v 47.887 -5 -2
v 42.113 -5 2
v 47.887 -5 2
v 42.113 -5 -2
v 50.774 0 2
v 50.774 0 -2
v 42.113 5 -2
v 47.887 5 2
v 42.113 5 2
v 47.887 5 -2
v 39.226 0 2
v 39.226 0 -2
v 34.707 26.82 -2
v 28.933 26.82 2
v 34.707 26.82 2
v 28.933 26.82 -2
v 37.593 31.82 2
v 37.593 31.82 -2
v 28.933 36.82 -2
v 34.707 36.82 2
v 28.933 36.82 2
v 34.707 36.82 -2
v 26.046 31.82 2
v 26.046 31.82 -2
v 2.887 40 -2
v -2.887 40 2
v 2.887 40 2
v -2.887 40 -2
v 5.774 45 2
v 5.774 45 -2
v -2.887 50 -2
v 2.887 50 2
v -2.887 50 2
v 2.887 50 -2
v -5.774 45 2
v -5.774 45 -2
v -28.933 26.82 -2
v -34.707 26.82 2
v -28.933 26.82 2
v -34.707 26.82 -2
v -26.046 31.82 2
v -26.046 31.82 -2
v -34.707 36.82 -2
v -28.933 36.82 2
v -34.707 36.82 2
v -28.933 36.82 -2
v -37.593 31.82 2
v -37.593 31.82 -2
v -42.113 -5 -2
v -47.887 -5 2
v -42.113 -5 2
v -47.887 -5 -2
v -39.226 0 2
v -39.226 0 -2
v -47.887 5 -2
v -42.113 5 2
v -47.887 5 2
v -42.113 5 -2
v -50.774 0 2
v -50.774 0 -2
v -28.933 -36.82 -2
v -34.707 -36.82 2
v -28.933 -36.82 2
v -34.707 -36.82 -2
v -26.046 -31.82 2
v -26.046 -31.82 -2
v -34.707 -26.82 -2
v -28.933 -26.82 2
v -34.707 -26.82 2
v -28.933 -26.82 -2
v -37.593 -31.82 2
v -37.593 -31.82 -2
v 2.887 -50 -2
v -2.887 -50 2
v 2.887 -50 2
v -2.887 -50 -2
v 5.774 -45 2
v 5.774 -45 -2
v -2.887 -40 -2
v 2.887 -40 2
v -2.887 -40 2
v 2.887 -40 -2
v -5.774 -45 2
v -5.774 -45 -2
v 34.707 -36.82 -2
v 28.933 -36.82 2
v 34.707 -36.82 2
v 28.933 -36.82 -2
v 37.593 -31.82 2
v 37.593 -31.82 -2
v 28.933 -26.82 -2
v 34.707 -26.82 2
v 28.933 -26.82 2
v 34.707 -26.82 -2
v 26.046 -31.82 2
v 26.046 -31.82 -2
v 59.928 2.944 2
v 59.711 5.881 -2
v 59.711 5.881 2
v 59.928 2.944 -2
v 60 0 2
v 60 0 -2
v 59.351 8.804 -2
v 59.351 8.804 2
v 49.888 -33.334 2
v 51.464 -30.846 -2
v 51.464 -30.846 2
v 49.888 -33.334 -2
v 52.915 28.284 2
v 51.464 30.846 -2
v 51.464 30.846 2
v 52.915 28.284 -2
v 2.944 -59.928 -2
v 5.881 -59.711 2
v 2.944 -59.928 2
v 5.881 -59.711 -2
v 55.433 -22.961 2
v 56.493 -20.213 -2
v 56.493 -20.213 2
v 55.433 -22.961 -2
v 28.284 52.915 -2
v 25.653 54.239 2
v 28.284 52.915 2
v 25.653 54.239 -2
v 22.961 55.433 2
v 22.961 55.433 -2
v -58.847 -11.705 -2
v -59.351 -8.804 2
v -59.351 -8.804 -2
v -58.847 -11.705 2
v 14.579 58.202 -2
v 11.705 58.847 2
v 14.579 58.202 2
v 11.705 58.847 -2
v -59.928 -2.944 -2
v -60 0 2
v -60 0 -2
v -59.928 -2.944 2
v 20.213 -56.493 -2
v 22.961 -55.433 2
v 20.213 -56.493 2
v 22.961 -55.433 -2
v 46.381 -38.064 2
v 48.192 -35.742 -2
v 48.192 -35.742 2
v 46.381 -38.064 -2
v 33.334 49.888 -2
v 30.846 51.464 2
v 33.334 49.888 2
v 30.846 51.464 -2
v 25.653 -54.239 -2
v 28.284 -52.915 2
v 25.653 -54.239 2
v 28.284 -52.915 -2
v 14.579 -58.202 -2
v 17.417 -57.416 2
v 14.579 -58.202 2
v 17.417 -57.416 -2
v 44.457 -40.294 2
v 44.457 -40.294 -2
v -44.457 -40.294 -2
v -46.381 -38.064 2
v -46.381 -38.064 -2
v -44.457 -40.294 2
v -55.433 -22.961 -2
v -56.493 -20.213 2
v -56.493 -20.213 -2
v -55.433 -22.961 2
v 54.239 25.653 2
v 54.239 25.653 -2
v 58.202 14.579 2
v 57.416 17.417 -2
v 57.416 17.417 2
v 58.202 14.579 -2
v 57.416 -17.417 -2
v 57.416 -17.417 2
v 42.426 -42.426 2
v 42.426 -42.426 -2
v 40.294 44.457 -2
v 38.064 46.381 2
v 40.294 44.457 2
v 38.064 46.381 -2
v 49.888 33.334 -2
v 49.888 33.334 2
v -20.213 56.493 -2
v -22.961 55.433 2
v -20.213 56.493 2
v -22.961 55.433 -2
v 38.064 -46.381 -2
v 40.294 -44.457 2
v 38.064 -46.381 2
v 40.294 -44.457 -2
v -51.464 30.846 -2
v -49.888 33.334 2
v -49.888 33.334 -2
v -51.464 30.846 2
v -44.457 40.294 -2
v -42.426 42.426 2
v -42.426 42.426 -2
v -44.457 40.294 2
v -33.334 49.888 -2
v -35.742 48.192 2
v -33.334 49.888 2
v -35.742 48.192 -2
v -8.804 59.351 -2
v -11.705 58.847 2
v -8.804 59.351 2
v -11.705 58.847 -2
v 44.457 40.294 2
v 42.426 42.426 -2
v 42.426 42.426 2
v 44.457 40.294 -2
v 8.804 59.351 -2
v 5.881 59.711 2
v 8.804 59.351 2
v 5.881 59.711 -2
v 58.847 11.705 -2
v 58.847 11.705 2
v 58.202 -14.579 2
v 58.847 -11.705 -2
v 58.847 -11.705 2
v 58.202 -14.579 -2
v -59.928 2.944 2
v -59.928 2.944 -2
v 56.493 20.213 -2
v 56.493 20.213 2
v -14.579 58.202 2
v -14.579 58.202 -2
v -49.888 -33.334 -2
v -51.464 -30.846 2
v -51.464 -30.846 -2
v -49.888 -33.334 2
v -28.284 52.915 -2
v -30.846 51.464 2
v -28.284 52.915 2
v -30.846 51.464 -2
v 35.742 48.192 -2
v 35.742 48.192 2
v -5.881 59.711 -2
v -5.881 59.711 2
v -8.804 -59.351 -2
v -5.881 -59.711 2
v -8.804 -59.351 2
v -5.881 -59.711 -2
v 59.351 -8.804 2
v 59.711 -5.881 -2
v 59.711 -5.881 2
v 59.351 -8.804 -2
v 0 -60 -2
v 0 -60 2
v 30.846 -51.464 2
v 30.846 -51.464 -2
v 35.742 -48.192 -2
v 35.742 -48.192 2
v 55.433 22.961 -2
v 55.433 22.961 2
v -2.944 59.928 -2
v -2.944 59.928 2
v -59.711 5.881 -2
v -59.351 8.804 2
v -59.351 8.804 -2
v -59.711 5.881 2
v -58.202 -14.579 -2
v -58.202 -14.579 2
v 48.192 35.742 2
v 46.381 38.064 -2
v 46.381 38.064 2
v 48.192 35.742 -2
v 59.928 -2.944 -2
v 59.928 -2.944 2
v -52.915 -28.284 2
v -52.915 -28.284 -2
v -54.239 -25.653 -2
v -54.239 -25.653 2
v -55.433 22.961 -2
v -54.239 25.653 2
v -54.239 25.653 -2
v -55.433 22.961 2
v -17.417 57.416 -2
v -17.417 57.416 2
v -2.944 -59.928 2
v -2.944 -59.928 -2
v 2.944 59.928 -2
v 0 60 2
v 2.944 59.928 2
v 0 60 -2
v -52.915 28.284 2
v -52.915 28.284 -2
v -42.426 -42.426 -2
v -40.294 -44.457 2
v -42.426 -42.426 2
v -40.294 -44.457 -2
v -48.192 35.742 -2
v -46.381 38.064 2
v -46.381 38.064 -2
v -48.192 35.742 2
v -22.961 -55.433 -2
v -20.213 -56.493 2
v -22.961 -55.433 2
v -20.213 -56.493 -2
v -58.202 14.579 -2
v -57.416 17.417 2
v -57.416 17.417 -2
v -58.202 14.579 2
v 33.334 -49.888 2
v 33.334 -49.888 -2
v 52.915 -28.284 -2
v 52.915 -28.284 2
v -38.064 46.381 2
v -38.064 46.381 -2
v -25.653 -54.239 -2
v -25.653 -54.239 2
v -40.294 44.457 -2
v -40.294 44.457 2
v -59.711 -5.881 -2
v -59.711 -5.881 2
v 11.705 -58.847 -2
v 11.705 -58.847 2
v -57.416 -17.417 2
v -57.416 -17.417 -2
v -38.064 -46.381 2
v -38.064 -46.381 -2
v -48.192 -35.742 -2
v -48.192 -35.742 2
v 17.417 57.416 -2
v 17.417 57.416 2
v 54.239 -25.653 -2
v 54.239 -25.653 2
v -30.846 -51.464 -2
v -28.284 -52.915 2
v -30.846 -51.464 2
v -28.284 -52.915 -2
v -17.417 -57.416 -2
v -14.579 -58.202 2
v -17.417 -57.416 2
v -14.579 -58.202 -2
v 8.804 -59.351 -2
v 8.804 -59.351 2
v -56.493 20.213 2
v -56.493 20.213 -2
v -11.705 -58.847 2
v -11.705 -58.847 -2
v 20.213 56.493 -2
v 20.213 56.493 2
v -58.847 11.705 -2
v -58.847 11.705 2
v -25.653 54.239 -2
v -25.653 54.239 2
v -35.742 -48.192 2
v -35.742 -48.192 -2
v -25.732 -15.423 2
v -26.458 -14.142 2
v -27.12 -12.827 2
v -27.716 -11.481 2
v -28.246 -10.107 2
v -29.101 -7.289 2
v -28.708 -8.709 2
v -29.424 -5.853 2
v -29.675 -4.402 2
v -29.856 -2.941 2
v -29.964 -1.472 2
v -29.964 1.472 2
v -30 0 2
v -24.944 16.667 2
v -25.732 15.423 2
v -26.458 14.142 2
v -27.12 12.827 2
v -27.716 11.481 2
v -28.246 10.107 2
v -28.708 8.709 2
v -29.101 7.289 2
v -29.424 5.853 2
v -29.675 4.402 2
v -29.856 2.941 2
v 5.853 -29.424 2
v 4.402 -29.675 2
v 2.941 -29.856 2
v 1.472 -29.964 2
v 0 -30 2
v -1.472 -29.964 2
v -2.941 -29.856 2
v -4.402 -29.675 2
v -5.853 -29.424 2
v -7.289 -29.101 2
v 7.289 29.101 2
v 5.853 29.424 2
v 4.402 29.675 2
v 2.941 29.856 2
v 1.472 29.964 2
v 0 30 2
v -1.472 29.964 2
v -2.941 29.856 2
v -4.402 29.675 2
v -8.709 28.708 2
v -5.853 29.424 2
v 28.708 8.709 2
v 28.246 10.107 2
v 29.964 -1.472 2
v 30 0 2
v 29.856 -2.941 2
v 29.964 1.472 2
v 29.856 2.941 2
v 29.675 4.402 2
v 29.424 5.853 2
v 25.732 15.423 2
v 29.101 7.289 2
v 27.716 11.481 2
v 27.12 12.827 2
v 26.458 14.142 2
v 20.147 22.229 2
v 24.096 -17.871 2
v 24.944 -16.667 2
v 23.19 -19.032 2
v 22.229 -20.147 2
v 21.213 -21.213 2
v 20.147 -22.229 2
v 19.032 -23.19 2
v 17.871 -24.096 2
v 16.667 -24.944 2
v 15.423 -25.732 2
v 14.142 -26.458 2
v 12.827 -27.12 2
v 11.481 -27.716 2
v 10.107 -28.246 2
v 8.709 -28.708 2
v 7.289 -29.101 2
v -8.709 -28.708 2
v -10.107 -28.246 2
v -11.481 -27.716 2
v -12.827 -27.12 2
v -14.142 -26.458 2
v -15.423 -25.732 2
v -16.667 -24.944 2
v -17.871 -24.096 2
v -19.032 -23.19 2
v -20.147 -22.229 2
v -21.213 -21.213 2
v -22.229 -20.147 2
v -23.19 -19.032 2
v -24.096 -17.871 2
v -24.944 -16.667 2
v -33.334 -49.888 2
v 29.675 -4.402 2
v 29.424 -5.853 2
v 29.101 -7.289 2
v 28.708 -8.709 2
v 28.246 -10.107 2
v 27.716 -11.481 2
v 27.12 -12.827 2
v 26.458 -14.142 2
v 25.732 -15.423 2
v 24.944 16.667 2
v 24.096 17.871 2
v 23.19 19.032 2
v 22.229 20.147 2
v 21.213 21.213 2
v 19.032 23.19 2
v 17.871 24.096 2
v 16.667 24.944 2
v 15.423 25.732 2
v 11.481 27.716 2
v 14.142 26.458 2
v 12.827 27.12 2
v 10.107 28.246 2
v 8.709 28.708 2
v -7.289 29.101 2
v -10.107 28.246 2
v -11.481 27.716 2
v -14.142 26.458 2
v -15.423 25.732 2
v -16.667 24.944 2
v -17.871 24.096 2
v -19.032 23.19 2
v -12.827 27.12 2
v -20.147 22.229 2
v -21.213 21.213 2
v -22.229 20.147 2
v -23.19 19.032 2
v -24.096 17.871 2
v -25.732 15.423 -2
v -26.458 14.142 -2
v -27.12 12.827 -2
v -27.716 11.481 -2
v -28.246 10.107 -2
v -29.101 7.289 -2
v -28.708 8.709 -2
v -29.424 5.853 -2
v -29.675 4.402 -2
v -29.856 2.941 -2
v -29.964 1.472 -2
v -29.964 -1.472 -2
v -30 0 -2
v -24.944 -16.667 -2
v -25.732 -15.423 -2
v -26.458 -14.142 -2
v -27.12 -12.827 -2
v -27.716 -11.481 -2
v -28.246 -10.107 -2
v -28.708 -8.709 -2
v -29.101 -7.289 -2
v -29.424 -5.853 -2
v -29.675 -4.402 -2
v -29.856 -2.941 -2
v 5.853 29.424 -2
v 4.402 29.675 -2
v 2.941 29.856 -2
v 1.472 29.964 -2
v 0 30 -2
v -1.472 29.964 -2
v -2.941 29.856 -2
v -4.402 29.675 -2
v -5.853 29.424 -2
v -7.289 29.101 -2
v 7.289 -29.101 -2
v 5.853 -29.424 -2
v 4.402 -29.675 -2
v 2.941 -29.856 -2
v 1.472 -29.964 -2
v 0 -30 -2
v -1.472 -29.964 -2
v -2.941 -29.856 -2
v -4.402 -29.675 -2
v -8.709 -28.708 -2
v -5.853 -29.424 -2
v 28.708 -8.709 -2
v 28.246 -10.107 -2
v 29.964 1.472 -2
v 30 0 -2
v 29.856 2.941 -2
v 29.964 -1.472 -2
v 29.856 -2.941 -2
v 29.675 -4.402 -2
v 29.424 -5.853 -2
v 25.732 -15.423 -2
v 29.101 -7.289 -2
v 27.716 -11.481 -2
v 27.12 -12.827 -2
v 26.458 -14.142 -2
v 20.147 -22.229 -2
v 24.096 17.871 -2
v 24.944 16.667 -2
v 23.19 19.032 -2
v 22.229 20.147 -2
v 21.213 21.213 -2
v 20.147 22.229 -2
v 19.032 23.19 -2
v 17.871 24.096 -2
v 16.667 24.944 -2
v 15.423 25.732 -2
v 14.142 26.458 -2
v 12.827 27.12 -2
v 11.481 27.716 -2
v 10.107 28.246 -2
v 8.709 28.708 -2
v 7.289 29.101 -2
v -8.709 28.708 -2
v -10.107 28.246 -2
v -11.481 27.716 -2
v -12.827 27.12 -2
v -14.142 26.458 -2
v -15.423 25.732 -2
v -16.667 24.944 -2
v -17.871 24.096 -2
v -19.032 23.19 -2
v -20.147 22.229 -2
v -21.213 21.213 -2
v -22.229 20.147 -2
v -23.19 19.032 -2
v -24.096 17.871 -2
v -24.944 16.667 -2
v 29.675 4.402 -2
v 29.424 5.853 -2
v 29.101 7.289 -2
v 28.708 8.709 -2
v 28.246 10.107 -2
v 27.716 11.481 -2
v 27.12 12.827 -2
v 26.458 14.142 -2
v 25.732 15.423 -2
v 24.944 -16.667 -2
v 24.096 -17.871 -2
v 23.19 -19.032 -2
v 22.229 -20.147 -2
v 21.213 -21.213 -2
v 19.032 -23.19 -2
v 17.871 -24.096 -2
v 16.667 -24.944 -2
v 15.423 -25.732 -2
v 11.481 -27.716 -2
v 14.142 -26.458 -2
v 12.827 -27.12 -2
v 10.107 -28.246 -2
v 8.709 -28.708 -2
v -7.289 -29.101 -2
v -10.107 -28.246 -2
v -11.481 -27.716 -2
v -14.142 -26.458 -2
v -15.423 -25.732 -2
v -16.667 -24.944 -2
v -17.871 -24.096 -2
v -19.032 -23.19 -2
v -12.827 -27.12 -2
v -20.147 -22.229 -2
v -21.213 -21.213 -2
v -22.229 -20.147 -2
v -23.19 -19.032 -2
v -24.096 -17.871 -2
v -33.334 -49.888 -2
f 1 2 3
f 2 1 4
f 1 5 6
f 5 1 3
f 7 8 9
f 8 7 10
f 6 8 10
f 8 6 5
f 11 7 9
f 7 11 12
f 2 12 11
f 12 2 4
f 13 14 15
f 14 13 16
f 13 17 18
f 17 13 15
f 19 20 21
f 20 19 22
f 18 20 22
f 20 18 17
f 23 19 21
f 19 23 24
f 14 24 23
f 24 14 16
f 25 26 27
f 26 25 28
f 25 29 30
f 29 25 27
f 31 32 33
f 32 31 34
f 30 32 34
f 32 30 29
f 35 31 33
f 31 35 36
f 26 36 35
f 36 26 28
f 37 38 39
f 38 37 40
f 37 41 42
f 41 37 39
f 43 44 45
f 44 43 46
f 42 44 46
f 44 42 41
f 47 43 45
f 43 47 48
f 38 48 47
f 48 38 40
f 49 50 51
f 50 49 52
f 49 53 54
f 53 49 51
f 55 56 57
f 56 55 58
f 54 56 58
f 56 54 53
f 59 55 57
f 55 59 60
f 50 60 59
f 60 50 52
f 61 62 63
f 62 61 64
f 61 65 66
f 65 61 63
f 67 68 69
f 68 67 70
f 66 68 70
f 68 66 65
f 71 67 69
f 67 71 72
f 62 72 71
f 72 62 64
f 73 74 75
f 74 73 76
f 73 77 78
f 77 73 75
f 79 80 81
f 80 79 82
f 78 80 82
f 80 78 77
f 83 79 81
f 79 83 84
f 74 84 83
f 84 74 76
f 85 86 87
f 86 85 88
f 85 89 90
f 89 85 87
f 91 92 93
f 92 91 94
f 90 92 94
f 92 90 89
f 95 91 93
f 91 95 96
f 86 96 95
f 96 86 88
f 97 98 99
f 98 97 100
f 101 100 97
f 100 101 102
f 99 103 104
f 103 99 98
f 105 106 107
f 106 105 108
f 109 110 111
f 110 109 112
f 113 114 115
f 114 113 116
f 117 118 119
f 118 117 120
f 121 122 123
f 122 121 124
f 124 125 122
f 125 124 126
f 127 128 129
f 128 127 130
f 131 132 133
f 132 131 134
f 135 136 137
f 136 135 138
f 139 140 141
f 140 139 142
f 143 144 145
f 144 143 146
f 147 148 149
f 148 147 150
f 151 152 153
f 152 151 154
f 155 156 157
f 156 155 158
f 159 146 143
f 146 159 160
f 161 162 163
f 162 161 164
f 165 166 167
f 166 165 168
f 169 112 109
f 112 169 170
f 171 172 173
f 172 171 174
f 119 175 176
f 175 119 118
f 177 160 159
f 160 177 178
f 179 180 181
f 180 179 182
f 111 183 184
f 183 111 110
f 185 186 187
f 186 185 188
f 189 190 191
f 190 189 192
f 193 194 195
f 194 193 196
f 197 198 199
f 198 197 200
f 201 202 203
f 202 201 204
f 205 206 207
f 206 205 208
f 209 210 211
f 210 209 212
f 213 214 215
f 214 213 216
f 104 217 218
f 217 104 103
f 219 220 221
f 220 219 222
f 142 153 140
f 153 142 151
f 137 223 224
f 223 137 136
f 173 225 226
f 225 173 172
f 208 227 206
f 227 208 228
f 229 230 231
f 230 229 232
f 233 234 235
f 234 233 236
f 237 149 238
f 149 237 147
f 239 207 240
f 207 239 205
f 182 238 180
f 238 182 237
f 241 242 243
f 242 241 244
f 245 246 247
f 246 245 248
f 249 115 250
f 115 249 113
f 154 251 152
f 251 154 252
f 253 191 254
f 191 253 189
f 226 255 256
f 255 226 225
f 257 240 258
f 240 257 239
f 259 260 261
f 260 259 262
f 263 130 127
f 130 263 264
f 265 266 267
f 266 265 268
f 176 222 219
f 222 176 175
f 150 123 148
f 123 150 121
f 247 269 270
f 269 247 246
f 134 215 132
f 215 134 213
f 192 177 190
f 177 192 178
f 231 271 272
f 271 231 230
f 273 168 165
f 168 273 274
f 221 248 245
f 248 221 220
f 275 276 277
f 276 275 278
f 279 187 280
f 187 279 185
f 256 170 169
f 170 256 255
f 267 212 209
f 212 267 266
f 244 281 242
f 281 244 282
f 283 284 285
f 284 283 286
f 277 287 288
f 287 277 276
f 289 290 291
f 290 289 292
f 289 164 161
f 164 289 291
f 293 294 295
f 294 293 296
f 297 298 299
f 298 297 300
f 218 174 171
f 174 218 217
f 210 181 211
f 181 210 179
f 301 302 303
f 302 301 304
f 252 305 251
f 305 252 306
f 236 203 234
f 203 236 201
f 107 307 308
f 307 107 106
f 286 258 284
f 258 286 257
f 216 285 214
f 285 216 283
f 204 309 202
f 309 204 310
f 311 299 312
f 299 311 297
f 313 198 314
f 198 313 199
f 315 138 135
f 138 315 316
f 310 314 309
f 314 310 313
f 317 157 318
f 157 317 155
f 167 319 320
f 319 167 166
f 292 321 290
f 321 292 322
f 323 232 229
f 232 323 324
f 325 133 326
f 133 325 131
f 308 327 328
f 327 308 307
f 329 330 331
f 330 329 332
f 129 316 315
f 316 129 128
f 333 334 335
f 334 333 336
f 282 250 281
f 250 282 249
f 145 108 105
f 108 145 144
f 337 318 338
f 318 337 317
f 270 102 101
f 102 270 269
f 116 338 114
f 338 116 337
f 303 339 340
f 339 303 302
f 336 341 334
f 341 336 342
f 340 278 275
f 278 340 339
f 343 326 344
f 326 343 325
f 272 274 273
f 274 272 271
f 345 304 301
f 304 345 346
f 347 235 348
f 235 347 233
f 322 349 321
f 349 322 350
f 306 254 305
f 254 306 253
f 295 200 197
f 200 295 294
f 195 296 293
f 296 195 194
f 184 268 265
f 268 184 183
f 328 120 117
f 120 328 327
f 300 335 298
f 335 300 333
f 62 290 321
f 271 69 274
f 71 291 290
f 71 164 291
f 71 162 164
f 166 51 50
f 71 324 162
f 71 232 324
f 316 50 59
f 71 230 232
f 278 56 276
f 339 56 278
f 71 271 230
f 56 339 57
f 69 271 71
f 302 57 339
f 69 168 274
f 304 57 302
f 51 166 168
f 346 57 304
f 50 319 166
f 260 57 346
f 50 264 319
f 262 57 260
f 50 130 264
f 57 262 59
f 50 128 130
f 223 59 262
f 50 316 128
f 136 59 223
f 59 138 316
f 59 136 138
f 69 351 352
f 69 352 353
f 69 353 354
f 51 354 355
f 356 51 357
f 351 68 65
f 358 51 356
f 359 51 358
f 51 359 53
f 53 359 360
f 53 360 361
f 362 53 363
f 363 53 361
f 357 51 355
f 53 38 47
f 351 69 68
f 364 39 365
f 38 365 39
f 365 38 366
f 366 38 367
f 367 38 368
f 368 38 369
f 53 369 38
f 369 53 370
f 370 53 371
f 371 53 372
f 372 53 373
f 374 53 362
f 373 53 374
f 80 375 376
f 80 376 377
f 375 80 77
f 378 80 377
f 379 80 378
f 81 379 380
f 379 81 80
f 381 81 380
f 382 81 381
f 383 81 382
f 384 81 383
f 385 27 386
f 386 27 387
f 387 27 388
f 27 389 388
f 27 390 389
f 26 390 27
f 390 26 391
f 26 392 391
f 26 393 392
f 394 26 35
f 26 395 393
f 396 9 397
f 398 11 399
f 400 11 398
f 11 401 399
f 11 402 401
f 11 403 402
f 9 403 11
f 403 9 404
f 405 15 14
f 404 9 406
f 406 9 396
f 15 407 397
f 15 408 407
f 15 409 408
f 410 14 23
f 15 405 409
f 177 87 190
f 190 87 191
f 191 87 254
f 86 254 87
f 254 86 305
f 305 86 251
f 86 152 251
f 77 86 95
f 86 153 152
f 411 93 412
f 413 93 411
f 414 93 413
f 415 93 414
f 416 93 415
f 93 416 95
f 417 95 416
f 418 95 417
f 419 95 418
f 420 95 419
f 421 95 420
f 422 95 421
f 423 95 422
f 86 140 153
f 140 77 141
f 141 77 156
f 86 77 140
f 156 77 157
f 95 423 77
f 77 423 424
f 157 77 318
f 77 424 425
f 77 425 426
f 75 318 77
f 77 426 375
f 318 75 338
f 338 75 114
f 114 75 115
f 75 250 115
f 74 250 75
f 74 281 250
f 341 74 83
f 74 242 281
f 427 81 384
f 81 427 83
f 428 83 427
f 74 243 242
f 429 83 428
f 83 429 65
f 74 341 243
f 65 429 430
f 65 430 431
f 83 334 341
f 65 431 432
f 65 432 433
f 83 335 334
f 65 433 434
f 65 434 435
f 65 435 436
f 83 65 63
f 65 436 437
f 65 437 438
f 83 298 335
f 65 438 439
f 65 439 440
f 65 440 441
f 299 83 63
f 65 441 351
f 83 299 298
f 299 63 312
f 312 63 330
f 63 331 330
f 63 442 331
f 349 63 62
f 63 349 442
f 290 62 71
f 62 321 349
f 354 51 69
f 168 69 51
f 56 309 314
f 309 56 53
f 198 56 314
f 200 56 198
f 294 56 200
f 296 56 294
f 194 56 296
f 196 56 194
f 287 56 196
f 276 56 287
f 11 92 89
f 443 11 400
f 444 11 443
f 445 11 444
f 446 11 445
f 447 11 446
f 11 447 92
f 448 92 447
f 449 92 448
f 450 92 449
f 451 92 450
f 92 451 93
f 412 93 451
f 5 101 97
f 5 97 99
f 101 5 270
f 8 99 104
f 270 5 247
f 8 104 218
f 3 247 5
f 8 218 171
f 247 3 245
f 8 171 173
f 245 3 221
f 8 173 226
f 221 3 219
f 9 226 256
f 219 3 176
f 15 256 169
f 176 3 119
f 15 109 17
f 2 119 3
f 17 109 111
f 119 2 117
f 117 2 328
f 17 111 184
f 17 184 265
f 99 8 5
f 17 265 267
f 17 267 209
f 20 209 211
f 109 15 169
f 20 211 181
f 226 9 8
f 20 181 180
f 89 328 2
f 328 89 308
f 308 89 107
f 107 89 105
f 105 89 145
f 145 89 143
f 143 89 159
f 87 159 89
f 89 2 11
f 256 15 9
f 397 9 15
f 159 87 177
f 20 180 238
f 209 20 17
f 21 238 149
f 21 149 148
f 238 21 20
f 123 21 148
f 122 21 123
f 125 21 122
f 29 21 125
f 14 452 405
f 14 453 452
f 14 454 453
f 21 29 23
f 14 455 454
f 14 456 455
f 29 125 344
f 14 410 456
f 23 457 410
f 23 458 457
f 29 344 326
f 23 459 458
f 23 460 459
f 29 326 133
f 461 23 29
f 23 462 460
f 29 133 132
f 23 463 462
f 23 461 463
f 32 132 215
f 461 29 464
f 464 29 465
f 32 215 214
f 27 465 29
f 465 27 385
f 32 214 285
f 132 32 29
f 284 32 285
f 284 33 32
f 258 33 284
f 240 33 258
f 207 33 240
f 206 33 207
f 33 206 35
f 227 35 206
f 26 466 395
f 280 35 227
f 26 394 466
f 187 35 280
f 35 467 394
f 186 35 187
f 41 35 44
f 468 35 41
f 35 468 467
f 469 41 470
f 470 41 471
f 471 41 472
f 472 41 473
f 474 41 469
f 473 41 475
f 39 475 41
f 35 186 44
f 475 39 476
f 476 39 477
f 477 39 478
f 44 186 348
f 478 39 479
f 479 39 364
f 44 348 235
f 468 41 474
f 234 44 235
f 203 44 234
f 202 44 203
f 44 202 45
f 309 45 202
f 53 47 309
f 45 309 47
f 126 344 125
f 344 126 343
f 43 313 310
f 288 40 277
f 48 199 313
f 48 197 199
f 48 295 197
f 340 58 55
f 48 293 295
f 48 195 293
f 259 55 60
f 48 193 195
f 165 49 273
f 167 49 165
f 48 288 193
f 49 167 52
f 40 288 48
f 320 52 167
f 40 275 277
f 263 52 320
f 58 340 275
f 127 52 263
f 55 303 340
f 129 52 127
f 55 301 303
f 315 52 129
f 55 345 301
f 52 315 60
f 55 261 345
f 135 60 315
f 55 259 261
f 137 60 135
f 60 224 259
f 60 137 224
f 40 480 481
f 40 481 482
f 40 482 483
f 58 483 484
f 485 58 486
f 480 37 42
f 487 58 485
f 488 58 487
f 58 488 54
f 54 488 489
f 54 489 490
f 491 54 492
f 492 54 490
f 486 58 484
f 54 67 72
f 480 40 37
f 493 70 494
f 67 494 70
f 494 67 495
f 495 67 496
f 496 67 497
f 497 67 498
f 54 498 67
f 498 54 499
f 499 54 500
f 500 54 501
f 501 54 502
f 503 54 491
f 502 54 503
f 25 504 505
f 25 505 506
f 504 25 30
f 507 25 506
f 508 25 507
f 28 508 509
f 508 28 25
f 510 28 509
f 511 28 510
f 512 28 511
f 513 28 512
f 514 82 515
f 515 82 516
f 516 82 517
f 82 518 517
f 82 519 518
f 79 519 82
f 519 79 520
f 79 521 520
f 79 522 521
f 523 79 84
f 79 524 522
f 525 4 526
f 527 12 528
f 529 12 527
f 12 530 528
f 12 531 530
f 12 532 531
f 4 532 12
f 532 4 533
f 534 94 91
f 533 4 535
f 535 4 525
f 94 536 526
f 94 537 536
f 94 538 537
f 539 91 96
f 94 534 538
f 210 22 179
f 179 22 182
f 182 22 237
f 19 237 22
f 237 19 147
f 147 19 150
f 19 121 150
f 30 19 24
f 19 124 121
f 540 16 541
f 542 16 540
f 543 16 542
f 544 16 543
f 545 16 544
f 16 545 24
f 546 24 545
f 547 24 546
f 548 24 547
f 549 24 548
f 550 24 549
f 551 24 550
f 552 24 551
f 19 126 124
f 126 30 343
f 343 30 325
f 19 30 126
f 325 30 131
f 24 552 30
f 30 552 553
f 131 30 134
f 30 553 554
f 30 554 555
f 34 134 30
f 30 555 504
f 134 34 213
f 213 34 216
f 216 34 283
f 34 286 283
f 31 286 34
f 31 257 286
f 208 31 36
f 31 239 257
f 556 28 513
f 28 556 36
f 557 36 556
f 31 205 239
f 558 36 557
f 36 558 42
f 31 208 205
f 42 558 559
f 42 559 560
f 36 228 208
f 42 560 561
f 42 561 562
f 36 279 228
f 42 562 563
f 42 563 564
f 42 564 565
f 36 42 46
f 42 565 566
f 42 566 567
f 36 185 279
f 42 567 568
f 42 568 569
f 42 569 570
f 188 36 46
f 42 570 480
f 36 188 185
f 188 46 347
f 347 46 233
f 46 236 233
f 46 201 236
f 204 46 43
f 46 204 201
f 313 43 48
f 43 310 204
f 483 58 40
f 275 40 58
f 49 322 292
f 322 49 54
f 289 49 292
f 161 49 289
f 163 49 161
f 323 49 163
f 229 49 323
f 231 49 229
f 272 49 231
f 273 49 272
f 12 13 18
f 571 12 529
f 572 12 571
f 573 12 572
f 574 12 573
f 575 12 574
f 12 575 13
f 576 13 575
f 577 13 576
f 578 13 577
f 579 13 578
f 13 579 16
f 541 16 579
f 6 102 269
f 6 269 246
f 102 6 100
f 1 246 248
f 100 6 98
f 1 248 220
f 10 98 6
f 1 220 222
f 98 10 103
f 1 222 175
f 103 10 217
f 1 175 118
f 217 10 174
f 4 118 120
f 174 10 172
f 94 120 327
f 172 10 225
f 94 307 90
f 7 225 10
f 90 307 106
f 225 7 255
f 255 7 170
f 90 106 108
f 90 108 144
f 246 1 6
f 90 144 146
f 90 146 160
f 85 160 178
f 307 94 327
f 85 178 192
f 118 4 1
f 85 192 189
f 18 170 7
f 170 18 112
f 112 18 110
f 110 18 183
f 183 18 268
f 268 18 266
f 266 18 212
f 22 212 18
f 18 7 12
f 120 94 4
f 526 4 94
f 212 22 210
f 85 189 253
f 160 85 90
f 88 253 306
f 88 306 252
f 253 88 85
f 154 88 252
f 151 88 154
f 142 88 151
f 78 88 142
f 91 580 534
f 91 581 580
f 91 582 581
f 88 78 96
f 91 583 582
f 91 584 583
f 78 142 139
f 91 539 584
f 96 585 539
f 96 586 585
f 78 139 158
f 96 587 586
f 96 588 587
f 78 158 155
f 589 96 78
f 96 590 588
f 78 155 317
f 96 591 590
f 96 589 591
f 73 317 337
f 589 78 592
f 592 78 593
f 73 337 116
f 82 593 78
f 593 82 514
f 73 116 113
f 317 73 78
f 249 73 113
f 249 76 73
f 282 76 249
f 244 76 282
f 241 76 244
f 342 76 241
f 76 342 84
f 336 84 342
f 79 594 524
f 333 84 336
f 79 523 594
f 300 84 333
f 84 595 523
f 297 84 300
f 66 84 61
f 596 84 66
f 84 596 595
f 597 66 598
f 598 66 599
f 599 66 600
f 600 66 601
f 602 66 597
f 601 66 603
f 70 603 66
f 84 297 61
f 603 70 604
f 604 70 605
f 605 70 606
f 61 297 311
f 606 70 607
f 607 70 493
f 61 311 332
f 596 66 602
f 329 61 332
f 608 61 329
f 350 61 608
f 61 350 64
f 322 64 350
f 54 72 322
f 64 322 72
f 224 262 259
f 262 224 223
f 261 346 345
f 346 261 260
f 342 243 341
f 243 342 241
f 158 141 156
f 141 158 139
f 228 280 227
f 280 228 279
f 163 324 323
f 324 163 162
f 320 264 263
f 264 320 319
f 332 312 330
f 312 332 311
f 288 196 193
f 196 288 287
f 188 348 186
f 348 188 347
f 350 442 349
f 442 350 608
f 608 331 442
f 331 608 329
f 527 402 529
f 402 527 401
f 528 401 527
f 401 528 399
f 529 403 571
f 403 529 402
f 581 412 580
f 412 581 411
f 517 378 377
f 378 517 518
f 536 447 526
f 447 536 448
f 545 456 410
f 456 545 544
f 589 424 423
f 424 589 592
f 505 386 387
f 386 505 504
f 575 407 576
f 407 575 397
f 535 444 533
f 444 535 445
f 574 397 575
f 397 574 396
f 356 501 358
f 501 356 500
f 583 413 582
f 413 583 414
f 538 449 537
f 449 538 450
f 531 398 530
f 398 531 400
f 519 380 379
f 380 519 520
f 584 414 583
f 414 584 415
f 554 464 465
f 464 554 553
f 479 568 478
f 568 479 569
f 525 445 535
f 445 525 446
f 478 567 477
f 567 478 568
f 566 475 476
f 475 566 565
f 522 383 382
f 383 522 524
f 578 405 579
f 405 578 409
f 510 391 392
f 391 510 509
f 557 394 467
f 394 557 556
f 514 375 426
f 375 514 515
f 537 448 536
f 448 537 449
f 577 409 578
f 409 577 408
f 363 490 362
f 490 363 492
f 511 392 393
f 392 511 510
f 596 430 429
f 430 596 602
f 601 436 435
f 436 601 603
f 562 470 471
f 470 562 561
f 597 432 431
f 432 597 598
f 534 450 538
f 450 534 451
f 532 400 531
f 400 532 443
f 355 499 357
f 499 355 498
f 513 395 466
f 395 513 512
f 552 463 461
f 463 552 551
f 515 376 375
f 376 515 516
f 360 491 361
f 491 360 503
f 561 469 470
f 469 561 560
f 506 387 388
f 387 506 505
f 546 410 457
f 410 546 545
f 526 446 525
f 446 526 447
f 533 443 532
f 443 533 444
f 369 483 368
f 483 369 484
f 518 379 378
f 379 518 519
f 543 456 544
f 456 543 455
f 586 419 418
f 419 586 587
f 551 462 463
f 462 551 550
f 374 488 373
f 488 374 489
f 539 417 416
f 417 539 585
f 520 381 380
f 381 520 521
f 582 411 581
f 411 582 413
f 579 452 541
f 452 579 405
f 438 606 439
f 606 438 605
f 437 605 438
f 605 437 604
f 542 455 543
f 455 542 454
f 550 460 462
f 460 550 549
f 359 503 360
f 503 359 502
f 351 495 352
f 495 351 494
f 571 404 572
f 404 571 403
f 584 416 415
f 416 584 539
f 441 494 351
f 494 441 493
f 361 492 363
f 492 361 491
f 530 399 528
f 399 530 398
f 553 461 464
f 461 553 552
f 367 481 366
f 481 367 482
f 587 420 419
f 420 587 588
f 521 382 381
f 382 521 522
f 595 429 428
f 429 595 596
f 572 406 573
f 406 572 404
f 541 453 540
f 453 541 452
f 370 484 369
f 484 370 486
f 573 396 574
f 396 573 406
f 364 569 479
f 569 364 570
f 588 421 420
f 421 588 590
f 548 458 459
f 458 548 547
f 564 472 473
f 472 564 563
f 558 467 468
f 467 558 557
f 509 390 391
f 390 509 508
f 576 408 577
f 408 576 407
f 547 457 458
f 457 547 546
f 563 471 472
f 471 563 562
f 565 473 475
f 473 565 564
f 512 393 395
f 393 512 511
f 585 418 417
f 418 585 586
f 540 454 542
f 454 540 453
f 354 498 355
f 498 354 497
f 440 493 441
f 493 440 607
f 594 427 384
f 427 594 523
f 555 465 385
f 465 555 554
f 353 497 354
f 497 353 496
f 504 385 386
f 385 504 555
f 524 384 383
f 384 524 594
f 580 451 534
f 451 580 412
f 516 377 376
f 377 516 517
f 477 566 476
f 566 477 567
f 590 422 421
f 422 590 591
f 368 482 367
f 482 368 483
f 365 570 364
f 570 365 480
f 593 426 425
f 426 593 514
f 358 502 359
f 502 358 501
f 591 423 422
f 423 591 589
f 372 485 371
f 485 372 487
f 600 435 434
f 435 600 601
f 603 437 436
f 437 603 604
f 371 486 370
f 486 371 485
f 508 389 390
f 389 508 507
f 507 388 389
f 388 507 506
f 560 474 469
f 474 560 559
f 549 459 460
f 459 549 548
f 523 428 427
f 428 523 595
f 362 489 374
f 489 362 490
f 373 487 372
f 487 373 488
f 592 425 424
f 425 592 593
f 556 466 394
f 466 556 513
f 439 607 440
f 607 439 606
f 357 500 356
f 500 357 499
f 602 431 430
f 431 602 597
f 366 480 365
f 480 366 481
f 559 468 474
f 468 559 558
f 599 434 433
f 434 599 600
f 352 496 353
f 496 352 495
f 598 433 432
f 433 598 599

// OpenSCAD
$fn=128;

plate_od = 120;
thickness = 4;

center_hole_d = 60;

bolt_circle_d = 90;
hex_hole_af = 10;
hex_hole_count = 8;

module hex_prism(af, h){
    r = af / sqrt(3);
    cylinder(h=h, r=r, $fn=6, center=true);
}

module bolt_circle_hex_holes(n, bcd, af, h){
    for(i = [0:n-1]){
        a = 360/n * i;
        translate([ (bcd/2)*cos(a), (bcd/2)*sin(a), 0 ])
            hex_prism(af, h);
    }
}

difference(){
    cylinder(h=thickness, d=plate_od, center=true);
    cylinder(h=thickness+2, d=center_hole_d, center=true);
    bolt_circle_hex_holes(hex_hole_count, bolt_circle_d, hex_hole_af, thickness+2);
}
